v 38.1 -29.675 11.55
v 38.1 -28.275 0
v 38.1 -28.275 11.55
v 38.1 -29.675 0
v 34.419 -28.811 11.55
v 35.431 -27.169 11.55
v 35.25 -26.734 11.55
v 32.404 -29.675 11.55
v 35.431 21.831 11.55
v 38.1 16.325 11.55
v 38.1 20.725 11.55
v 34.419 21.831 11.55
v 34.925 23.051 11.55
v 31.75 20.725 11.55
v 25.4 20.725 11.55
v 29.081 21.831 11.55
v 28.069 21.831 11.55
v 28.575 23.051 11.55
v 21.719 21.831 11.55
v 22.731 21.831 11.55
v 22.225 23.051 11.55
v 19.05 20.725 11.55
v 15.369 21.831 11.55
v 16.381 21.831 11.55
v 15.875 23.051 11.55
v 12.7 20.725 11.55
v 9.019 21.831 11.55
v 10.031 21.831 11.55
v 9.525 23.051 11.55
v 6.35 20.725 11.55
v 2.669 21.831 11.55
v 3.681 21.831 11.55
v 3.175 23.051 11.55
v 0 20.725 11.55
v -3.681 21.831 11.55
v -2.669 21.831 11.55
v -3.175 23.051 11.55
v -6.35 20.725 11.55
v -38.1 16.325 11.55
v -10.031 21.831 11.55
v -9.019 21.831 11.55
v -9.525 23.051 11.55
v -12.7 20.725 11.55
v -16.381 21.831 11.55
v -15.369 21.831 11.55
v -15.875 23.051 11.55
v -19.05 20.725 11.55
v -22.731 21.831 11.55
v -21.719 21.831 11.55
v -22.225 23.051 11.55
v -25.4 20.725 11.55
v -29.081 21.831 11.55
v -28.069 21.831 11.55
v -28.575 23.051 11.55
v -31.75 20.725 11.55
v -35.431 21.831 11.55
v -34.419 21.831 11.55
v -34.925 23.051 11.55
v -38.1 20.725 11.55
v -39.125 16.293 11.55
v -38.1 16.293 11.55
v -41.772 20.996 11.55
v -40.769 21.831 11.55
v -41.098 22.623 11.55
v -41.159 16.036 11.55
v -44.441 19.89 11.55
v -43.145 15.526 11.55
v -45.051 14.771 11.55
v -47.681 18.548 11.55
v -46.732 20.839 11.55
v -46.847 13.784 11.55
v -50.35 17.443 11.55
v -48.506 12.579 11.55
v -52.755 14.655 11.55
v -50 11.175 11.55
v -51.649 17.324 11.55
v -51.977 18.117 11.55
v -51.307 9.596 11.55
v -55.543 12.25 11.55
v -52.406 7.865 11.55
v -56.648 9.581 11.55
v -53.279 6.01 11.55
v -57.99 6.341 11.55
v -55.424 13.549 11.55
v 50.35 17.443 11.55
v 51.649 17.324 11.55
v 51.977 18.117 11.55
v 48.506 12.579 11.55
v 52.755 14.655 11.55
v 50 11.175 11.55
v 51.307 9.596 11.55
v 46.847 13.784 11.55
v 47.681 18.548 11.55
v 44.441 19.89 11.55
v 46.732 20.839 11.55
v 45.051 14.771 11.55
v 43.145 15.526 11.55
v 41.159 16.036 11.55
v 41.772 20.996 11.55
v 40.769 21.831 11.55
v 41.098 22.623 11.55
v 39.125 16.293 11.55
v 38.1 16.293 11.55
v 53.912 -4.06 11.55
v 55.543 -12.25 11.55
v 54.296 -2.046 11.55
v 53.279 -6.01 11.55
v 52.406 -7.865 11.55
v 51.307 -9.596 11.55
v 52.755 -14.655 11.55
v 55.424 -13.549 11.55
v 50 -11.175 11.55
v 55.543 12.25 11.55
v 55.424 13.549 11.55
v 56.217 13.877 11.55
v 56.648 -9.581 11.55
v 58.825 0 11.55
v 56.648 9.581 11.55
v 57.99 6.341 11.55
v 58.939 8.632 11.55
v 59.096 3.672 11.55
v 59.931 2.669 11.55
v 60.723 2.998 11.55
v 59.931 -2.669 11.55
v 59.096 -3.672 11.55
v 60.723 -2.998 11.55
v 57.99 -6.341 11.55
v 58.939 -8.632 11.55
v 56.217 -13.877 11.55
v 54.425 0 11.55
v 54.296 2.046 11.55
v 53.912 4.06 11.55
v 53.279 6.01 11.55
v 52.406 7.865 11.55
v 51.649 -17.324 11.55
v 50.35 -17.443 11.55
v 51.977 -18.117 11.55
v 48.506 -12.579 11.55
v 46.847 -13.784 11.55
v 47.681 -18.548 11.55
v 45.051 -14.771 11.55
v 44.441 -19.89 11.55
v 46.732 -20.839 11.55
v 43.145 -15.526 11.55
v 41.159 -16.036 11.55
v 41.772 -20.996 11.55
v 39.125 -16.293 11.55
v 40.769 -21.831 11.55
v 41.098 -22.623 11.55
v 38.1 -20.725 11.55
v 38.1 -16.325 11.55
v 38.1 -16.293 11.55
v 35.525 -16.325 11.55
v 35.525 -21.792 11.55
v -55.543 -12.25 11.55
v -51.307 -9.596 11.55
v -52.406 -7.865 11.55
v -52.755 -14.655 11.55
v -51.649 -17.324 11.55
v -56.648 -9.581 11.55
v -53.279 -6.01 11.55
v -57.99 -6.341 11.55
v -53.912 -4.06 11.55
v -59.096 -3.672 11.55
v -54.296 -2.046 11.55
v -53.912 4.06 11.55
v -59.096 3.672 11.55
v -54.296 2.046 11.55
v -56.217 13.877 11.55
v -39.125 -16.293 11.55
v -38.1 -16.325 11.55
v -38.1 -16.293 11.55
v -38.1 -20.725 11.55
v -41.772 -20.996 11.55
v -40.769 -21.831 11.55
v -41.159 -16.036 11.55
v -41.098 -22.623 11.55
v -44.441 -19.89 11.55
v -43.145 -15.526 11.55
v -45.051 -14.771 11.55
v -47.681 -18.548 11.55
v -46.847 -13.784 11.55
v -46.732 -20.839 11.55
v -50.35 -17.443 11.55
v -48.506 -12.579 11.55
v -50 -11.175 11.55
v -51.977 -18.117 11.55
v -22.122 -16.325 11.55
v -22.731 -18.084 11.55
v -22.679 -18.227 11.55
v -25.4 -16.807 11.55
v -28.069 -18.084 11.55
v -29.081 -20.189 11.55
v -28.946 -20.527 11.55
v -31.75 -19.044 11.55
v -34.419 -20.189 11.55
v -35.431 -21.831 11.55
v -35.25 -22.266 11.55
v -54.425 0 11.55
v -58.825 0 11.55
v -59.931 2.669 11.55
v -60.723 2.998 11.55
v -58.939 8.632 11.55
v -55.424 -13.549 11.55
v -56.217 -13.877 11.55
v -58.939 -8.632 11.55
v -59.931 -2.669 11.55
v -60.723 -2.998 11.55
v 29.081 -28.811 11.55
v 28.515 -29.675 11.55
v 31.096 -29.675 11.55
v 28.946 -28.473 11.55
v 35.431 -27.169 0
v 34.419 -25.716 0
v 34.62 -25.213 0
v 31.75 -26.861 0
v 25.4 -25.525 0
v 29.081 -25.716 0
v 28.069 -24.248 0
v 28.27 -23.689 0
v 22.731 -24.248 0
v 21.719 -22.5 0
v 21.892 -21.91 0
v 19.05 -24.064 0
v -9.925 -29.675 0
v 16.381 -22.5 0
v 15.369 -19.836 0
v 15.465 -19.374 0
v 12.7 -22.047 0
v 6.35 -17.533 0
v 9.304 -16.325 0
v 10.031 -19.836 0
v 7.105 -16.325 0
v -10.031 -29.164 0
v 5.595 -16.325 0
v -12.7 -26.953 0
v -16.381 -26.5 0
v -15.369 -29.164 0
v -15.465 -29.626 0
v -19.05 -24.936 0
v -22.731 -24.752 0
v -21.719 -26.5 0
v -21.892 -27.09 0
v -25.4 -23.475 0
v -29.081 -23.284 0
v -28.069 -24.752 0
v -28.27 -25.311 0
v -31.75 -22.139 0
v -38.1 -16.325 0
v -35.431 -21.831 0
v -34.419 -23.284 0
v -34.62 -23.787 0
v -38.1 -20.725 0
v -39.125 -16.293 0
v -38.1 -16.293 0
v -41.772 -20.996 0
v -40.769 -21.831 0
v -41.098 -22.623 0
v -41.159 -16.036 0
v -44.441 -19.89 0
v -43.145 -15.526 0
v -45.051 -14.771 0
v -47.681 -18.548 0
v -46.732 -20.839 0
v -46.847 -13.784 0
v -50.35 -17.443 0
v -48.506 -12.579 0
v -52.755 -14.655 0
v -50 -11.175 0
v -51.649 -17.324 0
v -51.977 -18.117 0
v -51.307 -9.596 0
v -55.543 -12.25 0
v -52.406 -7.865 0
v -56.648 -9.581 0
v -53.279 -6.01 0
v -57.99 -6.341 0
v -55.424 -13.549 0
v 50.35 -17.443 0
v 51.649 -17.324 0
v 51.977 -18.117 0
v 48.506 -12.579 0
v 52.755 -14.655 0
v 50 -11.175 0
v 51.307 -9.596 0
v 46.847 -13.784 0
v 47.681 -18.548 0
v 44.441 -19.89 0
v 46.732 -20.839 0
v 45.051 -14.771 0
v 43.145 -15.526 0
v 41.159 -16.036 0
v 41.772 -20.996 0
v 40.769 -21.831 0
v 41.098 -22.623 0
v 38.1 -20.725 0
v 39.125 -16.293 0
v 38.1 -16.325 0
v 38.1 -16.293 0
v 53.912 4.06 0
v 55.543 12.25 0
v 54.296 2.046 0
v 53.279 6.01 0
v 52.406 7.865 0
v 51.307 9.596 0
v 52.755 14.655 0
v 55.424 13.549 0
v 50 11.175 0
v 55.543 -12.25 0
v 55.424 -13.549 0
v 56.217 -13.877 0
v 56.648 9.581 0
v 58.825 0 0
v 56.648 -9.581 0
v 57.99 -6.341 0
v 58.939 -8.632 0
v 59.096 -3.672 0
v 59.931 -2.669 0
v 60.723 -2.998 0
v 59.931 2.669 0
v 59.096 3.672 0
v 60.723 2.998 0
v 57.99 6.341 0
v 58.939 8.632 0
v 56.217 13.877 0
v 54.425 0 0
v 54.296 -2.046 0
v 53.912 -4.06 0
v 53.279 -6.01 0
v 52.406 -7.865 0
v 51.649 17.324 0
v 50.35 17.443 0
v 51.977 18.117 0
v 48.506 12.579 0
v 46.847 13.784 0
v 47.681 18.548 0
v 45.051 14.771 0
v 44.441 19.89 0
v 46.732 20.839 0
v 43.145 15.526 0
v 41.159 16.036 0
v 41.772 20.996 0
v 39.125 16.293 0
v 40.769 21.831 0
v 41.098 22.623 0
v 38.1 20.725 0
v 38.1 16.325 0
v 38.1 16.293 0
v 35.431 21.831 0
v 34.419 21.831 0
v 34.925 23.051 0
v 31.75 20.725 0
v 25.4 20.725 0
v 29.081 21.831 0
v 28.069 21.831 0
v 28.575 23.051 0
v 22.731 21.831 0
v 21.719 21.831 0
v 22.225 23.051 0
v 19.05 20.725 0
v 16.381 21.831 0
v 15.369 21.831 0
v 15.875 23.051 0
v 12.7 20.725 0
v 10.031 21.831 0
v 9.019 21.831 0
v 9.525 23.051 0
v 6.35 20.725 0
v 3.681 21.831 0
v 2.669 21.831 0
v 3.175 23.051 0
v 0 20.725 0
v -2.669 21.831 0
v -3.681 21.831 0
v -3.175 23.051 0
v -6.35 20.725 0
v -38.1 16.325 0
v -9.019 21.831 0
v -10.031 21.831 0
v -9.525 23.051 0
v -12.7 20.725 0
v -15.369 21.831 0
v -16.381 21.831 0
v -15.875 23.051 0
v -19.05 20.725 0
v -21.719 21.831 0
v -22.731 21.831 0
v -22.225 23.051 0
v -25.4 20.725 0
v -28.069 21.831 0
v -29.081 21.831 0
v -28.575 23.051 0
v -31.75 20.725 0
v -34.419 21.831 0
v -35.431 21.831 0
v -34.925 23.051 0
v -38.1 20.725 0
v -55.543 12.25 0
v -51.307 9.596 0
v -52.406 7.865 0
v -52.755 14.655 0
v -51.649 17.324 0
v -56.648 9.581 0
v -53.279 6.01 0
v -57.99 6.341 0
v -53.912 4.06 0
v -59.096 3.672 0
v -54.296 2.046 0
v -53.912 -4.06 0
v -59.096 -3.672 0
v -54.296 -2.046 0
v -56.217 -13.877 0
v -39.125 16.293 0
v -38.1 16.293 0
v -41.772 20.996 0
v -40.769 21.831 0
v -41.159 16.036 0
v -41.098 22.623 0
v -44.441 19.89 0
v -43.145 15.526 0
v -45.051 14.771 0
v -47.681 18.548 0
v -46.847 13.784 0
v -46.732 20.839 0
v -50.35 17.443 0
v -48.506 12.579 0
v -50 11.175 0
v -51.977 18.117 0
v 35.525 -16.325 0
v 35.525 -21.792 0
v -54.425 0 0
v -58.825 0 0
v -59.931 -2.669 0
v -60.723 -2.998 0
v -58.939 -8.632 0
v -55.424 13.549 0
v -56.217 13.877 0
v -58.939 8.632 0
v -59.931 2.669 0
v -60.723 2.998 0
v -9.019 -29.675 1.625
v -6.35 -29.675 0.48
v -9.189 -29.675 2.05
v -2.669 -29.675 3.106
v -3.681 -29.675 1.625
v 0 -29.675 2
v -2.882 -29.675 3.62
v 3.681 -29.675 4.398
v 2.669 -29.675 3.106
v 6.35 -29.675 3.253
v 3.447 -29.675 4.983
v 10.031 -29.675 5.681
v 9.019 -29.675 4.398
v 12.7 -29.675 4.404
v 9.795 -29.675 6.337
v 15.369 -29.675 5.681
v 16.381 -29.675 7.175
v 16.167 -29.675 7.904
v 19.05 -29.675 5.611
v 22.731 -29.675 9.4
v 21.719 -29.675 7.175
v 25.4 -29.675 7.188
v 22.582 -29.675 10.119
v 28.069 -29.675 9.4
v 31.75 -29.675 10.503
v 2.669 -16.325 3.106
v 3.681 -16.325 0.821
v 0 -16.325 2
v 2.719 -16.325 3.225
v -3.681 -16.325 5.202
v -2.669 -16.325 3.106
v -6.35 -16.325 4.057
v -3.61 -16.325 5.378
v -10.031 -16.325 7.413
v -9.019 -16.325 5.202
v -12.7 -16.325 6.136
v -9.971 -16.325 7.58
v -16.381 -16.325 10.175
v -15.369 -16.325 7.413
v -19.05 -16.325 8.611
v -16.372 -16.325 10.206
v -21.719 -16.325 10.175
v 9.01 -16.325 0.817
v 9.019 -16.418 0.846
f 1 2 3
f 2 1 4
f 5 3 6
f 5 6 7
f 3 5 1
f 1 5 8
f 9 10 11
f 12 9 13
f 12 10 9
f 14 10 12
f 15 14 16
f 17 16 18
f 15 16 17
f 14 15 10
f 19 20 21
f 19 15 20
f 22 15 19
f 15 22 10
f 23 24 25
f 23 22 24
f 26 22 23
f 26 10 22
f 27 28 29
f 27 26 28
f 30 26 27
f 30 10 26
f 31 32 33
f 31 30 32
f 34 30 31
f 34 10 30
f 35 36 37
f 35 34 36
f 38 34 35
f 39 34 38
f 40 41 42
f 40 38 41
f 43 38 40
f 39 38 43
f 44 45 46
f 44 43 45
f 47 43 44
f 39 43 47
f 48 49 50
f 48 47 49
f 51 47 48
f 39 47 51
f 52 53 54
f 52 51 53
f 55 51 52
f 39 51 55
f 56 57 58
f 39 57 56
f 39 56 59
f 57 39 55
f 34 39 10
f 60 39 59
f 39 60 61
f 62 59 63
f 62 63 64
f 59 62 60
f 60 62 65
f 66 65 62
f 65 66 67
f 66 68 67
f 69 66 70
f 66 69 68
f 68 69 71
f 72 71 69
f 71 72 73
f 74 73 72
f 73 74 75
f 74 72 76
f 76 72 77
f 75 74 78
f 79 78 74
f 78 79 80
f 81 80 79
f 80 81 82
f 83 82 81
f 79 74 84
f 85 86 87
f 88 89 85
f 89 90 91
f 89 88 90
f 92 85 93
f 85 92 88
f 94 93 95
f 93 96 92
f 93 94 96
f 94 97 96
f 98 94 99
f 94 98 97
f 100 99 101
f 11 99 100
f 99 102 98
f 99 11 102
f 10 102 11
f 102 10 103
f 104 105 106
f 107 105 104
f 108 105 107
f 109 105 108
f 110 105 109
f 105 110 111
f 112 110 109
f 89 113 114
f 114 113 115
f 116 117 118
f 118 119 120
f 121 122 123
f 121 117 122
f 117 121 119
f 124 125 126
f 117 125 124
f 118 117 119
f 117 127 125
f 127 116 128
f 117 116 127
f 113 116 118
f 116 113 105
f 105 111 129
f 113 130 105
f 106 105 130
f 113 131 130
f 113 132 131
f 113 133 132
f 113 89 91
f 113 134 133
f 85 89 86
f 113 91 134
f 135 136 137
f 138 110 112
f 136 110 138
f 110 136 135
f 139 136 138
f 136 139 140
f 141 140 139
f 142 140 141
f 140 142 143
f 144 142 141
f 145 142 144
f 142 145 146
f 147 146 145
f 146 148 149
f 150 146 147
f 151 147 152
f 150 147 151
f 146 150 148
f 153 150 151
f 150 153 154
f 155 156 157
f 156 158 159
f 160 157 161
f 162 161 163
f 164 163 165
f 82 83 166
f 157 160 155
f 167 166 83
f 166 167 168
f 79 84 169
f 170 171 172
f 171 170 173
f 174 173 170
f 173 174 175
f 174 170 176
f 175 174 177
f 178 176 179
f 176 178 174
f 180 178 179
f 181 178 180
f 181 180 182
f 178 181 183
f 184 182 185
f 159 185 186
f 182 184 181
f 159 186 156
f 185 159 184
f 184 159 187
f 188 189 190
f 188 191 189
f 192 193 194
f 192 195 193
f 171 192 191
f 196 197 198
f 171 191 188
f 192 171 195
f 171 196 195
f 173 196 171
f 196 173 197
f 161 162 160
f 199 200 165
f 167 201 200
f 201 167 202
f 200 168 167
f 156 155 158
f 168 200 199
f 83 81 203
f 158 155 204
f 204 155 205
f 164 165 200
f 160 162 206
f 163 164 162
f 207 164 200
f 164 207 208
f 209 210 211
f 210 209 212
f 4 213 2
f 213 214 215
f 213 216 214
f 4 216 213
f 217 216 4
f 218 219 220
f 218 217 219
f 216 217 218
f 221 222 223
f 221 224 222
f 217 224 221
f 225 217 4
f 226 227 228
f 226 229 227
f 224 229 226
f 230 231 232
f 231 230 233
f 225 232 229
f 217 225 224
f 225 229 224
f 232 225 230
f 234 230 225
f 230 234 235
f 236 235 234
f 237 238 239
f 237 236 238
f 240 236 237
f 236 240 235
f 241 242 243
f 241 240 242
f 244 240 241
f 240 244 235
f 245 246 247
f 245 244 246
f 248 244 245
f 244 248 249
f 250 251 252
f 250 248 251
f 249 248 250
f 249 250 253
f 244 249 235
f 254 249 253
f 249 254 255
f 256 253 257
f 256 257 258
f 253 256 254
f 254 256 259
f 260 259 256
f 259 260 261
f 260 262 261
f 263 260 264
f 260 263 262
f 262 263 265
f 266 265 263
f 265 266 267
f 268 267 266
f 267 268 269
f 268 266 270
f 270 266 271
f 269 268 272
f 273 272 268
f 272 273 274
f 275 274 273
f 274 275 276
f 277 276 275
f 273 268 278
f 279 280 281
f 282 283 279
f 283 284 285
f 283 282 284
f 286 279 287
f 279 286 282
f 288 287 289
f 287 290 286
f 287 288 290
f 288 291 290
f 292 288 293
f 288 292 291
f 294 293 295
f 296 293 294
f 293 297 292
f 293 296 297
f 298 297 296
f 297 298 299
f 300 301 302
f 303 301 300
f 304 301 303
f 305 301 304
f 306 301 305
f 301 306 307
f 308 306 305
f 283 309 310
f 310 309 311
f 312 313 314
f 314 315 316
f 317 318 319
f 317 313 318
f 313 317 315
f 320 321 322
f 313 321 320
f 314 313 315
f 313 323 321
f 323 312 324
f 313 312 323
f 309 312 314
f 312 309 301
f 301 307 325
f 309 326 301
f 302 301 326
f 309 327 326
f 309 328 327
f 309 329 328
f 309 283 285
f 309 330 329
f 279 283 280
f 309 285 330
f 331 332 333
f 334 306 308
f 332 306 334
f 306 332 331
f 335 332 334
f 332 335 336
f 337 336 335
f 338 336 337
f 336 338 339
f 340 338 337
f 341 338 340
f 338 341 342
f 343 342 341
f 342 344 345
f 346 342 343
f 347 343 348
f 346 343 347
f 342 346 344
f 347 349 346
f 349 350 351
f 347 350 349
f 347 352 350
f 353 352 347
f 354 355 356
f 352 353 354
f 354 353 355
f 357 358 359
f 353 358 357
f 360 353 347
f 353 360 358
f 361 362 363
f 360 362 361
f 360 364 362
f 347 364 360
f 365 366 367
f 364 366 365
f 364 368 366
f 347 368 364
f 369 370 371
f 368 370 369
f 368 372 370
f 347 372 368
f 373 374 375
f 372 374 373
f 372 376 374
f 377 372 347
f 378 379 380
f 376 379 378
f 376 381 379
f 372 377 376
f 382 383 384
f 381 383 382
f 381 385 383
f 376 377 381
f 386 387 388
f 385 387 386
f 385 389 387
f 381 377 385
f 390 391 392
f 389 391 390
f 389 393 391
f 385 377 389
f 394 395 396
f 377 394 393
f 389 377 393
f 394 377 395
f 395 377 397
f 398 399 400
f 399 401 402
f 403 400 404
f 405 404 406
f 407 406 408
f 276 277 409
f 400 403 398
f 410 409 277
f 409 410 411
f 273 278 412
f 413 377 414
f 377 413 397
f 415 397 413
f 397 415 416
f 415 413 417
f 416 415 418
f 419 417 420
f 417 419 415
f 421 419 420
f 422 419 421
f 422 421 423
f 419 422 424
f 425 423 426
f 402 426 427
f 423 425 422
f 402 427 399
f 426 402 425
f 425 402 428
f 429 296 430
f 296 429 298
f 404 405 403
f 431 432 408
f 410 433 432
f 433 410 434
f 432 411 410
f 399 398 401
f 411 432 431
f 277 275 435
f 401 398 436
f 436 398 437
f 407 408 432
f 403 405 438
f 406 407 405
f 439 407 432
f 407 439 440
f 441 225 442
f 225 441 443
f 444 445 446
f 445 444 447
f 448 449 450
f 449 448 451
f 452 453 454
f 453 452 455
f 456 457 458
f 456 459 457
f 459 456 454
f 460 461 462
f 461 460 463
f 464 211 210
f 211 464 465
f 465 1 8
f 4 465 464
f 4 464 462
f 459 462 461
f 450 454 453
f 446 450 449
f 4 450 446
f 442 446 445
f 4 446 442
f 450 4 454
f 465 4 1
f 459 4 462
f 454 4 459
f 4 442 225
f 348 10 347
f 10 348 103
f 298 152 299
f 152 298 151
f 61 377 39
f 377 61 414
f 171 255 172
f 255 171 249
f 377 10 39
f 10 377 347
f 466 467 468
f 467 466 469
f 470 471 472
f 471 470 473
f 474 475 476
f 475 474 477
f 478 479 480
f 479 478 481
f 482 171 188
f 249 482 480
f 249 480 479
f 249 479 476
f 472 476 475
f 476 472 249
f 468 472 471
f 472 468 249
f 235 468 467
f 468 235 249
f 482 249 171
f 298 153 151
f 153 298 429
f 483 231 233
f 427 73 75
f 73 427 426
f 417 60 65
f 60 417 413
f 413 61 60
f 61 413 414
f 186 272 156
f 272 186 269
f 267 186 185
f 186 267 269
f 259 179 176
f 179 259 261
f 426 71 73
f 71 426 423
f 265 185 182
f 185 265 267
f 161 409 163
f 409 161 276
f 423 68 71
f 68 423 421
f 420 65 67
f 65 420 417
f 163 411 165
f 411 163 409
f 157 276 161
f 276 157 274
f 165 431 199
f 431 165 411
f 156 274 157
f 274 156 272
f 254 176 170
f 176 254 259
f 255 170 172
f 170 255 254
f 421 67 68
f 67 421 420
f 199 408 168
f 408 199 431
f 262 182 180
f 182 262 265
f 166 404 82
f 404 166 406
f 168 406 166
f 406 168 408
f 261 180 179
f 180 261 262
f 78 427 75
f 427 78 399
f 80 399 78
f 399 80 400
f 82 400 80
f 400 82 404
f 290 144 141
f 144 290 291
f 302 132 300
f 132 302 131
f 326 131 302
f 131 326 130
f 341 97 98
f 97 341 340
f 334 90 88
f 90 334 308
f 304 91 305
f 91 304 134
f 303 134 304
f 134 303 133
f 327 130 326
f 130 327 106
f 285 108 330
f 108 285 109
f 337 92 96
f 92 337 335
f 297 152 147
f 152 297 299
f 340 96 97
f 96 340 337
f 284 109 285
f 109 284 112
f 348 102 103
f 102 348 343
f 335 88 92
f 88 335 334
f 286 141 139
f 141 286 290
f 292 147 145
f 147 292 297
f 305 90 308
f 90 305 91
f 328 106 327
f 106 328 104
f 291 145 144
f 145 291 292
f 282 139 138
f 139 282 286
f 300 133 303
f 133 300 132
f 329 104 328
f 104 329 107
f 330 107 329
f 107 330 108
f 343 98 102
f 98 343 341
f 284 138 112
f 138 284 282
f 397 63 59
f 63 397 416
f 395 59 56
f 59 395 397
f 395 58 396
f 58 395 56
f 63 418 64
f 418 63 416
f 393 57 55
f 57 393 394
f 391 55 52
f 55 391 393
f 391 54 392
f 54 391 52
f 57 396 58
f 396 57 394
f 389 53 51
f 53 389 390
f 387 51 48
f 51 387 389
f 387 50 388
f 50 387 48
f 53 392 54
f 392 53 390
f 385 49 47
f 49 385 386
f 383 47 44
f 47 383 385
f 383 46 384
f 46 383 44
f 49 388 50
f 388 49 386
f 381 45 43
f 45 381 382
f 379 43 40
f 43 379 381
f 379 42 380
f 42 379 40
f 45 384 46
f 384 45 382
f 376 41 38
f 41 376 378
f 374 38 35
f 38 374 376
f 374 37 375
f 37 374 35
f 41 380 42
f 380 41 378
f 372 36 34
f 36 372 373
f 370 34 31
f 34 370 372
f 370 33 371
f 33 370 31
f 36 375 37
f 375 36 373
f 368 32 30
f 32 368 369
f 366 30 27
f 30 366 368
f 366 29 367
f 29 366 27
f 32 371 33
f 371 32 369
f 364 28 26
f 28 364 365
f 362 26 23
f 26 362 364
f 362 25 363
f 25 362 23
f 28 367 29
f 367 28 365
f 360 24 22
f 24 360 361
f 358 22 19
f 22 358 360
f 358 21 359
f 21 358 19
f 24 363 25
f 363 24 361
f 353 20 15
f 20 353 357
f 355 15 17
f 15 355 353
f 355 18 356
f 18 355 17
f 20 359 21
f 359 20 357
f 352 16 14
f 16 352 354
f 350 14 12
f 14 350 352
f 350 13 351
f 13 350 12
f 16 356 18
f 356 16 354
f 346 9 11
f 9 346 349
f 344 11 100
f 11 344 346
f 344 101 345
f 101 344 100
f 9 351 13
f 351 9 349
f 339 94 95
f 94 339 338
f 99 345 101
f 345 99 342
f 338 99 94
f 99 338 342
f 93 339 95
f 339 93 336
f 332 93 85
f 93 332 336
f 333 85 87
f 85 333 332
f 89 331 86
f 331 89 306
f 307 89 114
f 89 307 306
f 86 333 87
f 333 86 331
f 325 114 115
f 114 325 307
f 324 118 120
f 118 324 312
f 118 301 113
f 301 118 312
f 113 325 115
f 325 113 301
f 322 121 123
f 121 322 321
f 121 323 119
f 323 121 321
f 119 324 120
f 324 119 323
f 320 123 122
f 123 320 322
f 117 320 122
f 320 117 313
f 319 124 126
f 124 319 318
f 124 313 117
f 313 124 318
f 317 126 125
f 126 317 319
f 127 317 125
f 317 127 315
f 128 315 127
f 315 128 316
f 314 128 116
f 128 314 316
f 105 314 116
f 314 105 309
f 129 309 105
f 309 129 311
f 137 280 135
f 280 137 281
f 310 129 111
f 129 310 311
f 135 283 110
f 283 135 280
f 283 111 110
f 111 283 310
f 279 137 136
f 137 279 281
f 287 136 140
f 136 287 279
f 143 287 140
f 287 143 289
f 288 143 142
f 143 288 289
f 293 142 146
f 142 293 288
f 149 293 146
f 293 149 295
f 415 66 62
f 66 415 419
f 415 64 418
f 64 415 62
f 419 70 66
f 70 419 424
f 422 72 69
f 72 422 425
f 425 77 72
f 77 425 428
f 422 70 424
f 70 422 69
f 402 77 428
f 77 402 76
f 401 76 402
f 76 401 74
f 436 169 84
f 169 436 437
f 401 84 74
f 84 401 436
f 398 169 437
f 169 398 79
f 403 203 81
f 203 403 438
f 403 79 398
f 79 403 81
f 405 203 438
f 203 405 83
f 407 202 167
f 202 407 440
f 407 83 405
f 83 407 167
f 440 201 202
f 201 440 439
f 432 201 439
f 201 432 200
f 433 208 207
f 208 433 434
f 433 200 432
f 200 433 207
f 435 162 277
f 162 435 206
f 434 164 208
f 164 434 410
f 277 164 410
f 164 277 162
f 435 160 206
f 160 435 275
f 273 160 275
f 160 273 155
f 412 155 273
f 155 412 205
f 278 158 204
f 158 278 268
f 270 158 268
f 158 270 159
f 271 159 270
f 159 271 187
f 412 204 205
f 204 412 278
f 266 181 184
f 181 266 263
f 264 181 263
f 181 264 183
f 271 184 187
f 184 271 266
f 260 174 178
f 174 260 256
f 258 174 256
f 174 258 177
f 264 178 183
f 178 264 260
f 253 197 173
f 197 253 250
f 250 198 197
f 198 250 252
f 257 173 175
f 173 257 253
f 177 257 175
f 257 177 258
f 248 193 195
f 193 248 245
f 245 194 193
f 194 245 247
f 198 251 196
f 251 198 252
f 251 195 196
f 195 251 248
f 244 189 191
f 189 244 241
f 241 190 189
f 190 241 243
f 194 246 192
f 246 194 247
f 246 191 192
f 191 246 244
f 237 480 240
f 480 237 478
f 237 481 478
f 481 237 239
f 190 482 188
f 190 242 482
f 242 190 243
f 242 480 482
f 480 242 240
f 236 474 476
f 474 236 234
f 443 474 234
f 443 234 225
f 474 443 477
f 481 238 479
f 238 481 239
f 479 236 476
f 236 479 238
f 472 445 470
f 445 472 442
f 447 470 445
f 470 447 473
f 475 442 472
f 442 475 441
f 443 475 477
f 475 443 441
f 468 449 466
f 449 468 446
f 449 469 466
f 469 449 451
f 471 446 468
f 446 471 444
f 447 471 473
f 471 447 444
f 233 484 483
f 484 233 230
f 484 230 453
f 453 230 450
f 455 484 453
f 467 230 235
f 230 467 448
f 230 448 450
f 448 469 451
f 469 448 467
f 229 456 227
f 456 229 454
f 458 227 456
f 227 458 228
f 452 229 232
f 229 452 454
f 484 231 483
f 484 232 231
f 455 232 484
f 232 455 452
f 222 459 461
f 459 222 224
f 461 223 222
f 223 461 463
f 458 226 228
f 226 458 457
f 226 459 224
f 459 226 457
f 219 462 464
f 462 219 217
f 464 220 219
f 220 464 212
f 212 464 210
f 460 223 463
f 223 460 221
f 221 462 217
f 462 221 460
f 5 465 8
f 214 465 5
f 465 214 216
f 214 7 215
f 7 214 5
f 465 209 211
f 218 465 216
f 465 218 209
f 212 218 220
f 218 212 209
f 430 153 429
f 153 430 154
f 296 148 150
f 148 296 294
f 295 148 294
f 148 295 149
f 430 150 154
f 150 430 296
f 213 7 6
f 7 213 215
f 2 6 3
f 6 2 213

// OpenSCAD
dowelRad = 0.5*0.25*25.4;
holeRad = 7.55/2;
linearSideLength = 12*2*dowelRad;
loopAngleOffset = 180/12;
width = 49;
turnAngleOffset = 180/12;
height = 7.55+4;

difference ()
{
	union ()
	{
		translate([-linearSideLength/2,-width/2,0])
		cube([linearSideLength,width,height]);
		translate([-linearSideLength/2,0,0])
		cylinder(r=width/2,h=height,$fn=50);
		translate([linearSideLength/2,0,0])
		cylinder(r=width/2,h=height,$fn=50);
		translate([-linearSideLength/2,-width/2-6.35/2-2,0])
		cube([linearSideLength,6.35+4,height]);
	}
	union ()
	{
		translate([-linearSideLength/2,-width/2+6.35/2+5,0])
		cube([linearSideLength,width-6.35-10,height]);
		translate([-linearSideLength/2,0,0])
		cylinder(r=width/2-6.35/2-5,h=height,$fn=50);
		translate([linearSideLength/2,0,0])
		cylinder(r=width/2-6.35/2-5,h=height,$fn=50);
	}
	// Straight holes
	union ()
	{
		for (i=[1:13])
		{
			translate([-linearSideLength/2+2*(i-1)*dowelRad,width/2,0])
			cylinder(r=holeRad,h=height,$fn=8);
		}
	}
	// Turn holes one side
	union ()
	{
		translate([linearSideLength/2,0,0])
		{
			for (i=[1:11])
			{
				translate([(width/2)*sin(i*turnAngleOffset),(width/2)*cos(i*turnAngleOffset),0])
				cylinder (r=holeRad,h=height,$fn=8);
			}
		}
	}
	// Turn holes other side
	union ()
	{
		translate([-linearSideLength/2,0,0])
		{
			for (i=[1:11])
			{
				translate([-(width/2)*sin(i*turnAngleOffset),(width/2)*cos(i*turnAngleOffset),0])
				cylinder (r=holeRad,h=height,$fn=8);
			}
		}
	}
	// Half loop holes
	union ()
	{
		for (i=[1:12])
		{
			translate([-linearSideLength/2+2*(i-1)*dowelRad,-width/2,height/2])
			rotate(a=-(i-1)*loopAngleOffset,v=[1,0,0])
			{
				cylinder(r=holeRad,h=2*height,center=true,$fn=8);
				translate([-holeRad,-12,-height]) cube([2*holeRad,12,2*height]);
			}
		}
	}
	// Last half loop hole
	translate([linearSideLength/2,-width/2,0]) cylinder(r=holeRad,h=height,$fn=8);
}
